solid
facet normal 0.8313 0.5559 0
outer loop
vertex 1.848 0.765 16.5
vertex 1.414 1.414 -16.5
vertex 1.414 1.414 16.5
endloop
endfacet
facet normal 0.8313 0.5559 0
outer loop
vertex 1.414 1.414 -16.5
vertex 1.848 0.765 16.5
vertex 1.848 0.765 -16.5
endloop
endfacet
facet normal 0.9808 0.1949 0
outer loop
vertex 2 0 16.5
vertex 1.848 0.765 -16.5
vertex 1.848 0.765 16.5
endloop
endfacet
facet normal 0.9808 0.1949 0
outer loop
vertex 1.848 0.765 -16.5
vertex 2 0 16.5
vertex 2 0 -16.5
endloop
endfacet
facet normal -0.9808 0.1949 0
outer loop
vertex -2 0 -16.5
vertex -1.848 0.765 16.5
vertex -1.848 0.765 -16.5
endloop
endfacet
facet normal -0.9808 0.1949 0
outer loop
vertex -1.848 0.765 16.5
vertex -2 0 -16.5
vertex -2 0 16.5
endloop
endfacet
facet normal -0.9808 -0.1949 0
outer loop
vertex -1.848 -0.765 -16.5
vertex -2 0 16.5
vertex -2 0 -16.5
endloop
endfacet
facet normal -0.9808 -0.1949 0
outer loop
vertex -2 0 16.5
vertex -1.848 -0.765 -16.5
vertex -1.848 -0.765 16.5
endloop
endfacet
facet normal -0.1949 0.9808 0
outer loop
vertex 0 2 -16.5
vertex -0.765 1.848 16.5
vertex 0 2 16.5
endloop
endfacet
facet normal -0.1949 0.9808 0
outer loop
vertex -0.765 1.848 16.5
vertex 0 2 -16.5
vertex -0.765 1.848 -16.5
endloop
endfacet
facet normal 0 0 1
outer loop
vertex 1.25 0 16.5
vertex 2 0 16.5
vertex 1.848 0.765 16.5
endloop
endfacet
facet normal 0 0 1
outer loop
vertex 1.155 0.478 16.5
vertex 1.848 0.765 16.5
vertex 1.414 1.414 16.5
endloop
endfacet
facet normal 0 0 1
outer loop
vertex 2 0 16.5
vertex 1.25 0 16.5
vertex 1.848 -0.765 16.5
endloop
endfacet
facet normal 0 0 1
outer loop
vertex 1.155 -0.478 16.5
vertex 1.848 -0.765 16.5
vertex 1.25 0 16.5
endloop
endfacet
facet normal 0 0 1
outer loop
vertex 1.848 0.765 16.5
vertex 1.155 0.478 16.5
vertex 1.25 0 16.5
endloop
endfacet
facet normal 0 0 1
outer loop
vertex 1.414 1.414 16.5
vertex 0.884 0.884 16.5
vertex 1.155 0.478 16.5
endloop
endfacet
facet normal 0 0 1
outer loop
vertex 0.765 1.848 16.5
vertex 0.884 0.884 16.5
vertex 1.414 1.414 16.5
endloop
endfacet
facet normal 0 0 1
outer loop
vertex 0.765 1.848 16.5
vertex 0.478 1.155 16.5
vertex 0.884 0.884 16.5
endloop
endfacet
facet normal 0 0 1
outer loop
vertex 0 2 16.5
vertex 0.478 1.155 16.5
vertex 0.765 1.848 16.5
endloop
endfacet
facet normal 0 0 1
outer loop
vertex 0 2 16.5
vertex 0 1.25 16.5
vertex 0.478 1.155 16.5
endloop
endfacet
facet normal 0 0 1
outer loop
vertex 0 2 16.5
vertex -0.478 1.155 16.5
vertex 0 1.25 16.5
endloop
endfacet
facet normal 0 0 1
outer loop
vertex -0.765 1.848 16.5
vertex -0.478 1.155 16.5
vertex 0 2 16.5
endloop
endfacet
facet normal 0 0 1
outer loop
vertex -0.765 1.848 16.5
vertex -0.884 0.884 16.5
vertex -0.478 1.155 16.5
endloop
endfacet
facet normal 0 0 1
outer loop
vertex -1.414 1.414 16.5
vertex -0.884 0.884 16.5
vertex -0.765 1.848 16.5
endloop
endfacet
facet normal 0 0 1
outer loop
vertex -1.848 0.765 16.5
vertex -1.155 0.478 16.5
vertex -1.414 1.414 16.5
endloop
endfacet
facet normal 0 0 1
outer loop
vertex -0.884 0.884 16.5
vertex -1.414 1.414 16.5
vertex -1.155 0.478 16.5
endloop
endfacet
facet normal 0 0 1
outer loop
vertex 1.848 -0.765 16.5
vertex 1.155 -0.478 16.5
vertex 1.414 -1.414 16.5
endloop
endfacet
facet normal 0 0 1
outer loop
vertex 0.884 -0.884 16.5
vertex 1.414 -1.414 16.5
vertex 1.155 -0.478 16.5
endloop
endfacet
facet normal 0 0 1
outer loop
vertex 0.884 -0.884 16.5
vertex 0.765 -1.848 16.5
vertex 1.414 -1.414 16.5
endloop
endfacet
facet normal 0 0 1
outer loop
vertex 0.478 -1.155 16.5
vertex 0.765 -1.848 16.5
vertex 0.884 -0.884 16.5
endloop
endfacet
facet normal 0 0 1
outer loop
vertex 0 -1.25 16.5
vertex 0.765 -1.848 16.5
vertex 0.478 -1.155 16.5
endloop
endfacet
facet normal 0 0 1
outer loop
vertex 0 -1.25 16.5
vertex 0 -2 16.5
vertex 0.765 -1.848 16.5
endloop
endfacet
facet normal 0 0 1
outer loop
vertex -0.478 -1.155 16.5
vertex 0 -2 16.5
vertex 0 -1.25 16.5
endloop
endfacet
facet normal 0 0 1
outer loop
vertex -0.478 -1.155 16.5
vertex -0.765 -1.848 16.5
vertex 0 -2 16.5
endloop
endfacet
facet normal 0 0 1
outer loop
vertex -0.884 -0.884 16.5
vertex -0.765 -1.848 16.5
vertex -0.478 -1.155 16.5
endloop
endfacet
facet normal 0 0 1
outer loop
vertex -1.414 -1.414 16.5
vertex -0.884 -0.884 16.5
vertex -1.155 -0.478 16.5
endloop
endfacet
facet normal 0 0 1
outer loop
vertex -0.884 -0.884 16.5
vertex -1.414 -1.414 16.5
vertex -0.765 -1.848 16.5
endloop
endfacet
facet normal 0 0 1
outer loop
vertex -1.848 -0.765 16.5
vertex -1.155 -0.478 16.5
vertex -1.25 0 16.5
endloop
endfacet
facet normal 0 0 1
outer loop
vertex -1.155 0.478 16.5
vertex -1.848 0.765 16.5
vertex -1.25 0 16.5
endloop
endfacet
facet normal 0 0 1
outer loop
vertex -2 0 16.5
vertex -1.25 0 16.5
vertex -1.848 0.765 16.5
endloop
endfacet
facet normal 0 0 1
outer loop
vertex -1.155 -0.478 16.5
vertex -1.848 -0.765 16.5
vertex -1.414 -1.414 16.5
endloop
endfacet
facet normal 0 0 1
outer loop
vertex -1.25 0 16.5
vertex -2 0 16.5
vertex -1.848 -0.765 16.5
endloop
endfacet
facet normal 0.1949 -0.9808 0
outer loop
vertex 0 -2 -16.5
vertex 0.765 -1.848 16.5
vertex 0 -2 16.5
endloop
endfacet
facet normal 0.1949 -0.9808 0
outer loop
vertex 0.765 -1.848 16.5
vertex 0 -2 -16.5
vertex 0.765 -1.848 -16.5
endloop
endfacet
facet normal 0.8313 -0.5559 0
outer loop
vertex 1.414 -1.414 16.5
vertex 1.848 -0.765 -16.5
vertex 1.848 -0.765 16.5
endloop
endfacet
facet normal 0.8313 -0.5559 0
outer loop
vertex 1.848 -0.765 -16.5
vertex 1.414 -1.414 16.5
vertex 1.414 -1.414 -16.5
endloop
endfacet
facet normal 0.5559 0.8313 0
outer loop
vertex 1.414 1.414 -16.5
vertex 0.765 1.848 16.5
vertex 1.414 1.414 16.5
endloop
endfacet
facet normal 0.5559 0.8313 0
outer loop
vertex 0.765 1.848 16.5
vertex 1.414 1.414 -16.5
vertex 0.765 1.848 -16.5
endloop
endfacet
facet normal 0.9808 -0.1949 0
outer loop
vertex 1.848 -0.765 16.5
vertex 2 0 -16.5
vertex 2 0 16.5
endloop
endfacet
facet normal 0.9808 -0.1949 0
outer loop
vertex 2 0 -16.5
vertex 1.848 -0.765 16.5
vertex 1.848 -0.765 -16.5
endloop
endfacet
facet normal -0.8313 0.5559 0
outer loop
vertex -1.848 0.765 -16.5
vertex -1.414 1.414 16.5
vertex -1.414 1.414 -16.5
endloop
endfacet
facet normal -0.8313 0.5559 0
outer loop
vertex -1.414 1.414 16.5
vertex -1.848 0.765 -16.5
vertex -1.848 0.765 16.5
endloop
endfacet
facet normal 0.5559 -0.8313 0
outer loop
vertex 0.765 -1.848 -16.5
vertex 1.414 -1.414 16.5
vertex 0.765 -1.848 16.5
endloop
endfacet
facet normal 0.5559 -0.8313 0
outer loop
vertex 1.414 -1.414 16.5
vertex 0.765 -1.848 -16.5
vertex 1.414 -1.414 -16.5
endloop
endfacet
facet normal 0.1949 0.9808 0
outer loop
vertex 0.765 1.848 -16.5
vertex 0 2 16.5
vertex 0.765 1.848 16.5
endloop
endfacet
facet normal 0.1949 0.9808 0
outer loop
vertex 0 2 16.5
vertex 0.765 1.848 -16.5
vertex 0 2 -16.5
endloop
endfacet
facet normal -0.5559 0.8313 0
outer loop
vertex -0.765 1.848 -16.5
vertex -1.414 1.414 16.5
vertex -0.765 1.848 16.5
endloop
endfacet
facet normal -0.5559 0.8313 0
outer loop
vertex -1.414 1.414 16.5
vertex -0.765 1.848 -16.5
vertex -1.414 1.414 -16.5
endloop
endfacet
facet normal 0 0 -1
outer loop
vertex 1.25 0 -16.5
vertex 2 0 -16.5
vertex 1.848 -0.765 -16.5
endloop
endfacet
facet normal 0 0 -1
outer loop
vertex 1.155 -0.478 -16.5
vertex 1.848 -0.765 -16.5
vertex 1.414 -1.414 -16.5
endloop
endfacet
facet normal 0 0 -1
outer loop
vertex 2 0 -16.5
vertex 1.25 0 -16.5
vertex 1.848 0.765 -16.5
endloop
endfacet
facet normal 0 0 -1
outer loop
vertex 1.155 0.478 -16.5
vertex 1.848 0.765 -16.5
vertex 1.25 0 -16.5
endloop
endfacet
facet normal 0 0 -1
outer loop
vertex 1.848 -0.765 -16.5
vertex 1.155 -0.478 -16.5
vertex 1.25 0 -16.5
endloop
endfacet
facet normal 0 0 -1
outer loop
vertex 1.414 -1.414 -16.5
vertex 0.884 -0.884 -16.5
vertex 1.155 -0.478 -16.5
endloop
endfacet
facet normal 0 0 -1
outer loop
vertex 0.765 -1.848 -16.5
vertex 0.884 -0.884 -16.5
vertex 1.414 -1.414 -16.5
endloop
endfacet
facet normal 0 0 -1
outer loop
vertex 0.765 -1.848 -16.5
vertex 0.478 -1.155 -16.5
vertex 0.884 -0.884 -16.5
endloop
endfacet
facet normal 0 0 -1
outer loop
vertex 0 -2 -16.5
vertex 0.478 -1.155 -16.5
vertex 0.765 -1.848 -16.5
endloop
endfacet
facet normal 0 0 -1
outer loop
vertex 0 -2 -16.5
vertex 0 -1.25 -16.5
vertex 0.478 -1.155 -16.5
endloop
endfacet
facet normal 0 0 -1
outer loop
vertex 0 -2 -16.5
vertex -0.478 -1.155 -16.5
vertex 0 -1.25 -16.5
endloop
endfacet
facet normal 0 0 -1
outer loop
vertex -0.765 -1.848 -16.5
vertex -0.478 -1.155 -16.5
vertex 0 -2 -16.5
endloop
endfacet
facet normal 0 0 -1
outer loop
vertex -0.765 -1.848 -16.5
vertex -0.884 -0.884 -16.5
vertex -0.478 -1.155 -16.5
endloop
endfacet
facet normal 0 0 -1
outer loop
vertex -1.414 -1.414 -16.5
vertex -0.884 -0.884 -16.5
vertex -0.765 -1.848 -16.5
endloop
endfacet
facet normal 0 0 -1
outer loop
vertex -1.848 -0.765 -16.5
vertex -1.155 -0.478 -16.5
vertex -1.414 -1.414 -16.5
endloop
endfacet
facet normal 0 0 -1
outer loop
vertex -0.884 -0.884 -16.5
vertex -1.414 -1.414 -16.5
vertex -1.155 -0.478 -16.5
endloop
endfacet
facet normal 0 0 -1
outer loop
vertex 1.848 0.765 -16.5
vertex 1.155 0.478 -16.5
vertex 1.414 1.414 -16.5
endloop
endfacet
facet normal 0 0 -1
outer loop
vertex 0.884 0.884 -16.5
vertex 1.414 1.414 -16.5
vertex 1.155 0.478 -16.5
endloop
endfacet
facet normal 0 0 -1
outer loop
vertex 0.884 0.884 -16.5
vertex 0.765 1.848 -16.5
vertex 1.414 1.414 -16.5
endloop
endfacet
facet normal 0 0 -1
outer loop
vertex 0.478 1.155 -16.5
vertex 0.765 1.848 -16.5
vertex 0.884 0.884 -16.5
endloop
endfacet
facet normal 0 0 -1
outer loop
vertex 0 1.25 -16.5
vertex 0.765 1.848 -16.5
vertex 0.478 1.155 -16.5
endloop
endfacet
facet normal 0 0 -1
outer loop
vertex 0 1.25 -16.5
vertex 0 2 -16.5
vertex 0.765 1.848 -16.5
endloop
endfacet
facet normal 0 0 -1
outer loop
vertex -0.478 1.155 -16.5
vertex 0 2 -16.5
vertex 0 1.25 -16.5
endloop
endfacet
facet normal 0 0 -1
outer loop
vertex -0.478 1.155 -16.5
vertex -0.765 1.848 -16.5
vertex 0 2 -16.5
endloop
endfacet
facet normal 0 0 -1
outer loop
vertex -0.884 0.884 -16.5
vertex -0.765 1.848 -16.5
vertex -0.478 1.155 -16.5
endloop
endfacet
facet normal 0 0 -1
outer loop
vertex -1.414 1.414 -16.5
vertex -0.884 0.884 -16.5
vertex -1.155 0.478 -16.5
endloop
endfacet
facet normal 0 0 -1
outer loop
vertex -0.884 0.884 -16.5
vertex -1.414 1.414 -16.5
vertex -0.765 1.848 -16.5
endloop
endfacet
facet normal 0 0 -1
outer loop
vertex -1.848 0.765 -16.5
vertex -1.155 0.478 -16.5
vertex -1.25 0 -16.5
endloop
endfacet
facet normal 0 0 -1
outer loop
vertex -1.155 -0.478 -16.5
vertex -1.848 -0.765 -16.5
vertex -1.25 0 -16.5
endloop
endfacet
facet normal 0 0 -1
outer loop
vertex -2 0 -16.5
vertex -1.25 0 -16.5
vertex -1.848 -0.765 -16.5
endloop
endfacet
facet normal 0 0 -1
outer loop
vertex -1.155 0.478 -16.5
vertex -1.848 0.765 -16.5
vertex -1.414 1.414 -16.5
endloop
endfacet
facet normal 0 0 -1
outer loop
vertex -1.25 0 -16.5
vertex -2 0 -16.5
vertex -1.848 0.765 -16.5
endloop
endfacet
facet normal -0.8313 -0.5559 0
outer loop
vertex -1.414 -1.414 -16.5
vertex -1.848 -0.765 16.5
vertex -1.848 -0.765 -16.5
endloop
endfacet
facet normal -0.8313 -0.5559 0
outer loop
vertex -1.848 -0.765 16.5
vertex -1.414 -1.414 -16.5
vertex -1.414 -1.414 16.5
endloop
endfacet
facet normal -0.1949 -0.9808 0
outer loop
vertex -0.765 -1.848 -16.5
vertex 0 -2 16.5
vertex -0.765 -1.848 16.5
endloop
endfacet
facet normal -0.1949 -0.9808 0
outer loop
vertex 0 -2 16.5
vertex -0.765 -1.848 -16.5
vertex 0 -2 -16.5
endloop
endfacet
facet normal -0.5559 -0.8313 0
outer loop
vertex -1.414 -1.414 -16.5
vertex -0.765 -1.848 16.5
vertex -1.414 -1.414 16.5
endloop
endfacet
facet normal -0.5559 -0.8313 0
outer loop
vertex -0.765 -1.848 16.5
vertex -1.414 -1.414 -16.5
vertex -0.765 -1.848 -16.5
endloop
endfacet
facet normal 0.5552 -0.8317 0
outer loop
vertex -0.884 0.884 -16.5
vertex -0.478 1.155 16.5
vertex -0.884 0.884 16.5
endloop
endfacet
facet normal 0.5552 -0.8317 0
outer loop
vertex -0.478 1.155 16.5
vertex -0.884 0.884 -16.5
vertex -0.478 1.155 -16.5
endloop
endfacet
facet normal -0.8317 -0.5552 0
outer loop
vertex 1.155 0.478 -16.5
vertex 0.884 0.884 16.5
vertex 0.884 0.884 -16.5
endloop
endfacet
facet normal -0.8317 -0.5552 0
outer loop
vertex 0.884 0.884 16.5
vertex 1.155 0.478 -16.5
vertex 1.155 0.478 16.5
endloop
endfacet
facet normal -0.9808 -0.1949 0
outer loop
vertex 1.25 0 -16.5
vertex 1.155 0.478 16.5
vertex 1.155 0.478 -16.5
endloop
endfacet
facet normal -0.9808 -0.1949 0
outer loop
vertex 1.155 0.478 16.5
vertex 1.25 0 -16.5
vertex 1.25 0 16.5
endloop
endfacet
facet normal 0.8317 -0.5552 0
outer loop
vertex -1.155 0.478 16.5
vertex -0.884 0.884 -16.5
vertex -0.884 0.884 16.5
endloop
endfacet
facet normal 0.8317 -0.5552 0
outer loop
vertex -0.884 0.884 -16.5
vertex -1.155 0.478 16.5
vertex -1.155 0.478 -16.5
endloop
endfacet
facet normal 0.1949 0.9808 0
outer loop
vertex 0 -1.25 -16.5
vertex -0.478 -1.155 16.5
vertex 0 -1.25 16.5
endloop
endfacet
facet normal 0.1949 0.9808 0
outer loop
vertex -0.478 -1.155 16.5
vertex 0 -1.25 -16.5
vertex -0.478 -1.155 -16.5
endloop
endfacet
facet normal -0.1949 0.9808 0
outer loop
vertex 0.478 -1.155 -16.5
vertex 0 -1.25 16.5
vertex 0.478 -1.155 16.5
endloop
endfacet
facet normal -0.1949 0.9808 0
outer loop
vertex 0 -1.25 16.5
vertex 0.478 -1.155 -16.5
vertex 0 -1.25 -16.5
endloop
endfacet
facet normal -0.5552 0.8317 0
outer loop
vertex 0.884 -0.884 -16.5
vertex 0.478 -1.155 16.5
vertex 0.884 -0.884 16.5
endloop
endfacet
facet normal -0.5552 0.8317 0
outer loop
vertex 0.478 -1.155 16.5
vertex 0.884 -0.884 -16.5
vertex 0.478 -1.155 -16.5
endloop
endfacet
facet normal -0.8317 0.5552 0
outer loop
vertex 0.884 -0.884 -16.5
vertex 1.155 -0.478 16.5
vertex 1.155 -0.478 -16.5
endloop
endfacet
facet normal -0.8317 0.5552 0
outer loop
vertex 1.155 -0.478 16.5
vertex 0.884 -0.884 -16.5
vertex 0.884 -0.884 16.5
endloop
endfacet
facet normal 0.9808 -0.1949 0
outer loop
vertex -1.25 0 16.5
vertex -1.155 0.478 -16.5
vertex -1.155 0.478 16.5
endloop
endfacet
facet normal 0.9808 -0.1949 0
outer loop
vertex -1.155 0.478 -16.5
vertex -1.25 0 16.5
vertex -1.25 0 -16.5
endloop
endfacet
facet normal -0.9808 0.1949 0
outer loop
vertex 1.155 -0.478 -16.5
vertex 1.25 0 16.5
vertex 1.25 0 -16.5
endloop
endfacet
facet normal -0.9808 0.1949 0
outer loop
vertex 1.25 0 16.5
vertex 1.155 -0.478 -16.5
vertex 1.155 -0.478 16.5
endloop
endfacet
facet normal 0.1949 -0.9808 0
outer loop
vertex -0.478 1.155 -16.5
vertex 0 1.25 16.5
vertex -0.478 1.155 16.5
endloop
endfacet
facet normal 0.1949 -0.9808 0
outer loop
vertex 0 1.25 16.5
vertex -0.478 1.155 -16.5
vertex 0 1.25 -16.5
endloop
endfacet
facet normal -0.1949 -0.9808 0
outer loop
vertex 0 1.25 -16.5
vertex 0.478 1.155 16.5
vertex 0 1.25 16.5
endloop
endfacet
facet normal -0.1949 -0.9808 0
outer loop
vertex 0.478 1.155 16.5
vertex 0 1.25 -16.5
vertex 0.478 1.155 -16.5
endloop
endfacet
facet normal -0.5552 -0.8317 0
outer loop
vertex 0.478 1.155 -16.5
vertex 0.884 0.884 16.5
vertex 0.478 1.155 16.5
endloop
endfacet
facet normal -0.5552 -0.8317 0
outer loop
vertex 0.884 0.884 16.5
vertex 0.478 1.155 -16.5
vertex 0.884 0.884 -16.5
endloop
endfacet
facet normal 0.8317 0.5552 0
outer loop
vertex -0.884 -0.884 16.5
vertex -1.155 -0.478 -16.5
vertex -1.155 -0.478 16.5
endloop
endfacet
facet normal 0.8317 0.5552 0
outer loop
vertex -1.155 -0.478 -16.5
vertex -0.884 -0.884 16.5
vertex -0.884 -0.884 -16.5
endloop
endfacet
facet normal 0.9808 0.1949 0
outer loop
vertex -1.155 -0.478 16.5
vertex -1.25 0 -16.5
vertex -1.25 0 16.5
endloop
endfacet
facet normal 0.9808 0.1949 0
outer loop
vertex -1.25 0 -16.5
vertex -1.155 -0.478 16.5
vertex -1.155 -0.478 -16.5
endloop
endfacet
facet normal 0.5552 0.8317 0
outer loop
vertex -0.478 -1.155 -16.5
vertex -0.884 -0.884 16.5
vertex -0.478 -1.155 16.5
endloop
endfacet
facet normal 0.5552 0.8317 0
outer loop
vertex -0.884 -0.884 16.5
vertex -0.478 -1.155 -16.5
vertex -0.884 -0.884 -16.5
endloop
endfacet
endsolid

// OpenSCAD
// COBRA Tendon Guide - 33.0mm

$fn = 16;

difference() {
    cylinder(h=33.0, d=4, center=true);
    cylinder(h=35.0, d=2.5, center=true);
}
